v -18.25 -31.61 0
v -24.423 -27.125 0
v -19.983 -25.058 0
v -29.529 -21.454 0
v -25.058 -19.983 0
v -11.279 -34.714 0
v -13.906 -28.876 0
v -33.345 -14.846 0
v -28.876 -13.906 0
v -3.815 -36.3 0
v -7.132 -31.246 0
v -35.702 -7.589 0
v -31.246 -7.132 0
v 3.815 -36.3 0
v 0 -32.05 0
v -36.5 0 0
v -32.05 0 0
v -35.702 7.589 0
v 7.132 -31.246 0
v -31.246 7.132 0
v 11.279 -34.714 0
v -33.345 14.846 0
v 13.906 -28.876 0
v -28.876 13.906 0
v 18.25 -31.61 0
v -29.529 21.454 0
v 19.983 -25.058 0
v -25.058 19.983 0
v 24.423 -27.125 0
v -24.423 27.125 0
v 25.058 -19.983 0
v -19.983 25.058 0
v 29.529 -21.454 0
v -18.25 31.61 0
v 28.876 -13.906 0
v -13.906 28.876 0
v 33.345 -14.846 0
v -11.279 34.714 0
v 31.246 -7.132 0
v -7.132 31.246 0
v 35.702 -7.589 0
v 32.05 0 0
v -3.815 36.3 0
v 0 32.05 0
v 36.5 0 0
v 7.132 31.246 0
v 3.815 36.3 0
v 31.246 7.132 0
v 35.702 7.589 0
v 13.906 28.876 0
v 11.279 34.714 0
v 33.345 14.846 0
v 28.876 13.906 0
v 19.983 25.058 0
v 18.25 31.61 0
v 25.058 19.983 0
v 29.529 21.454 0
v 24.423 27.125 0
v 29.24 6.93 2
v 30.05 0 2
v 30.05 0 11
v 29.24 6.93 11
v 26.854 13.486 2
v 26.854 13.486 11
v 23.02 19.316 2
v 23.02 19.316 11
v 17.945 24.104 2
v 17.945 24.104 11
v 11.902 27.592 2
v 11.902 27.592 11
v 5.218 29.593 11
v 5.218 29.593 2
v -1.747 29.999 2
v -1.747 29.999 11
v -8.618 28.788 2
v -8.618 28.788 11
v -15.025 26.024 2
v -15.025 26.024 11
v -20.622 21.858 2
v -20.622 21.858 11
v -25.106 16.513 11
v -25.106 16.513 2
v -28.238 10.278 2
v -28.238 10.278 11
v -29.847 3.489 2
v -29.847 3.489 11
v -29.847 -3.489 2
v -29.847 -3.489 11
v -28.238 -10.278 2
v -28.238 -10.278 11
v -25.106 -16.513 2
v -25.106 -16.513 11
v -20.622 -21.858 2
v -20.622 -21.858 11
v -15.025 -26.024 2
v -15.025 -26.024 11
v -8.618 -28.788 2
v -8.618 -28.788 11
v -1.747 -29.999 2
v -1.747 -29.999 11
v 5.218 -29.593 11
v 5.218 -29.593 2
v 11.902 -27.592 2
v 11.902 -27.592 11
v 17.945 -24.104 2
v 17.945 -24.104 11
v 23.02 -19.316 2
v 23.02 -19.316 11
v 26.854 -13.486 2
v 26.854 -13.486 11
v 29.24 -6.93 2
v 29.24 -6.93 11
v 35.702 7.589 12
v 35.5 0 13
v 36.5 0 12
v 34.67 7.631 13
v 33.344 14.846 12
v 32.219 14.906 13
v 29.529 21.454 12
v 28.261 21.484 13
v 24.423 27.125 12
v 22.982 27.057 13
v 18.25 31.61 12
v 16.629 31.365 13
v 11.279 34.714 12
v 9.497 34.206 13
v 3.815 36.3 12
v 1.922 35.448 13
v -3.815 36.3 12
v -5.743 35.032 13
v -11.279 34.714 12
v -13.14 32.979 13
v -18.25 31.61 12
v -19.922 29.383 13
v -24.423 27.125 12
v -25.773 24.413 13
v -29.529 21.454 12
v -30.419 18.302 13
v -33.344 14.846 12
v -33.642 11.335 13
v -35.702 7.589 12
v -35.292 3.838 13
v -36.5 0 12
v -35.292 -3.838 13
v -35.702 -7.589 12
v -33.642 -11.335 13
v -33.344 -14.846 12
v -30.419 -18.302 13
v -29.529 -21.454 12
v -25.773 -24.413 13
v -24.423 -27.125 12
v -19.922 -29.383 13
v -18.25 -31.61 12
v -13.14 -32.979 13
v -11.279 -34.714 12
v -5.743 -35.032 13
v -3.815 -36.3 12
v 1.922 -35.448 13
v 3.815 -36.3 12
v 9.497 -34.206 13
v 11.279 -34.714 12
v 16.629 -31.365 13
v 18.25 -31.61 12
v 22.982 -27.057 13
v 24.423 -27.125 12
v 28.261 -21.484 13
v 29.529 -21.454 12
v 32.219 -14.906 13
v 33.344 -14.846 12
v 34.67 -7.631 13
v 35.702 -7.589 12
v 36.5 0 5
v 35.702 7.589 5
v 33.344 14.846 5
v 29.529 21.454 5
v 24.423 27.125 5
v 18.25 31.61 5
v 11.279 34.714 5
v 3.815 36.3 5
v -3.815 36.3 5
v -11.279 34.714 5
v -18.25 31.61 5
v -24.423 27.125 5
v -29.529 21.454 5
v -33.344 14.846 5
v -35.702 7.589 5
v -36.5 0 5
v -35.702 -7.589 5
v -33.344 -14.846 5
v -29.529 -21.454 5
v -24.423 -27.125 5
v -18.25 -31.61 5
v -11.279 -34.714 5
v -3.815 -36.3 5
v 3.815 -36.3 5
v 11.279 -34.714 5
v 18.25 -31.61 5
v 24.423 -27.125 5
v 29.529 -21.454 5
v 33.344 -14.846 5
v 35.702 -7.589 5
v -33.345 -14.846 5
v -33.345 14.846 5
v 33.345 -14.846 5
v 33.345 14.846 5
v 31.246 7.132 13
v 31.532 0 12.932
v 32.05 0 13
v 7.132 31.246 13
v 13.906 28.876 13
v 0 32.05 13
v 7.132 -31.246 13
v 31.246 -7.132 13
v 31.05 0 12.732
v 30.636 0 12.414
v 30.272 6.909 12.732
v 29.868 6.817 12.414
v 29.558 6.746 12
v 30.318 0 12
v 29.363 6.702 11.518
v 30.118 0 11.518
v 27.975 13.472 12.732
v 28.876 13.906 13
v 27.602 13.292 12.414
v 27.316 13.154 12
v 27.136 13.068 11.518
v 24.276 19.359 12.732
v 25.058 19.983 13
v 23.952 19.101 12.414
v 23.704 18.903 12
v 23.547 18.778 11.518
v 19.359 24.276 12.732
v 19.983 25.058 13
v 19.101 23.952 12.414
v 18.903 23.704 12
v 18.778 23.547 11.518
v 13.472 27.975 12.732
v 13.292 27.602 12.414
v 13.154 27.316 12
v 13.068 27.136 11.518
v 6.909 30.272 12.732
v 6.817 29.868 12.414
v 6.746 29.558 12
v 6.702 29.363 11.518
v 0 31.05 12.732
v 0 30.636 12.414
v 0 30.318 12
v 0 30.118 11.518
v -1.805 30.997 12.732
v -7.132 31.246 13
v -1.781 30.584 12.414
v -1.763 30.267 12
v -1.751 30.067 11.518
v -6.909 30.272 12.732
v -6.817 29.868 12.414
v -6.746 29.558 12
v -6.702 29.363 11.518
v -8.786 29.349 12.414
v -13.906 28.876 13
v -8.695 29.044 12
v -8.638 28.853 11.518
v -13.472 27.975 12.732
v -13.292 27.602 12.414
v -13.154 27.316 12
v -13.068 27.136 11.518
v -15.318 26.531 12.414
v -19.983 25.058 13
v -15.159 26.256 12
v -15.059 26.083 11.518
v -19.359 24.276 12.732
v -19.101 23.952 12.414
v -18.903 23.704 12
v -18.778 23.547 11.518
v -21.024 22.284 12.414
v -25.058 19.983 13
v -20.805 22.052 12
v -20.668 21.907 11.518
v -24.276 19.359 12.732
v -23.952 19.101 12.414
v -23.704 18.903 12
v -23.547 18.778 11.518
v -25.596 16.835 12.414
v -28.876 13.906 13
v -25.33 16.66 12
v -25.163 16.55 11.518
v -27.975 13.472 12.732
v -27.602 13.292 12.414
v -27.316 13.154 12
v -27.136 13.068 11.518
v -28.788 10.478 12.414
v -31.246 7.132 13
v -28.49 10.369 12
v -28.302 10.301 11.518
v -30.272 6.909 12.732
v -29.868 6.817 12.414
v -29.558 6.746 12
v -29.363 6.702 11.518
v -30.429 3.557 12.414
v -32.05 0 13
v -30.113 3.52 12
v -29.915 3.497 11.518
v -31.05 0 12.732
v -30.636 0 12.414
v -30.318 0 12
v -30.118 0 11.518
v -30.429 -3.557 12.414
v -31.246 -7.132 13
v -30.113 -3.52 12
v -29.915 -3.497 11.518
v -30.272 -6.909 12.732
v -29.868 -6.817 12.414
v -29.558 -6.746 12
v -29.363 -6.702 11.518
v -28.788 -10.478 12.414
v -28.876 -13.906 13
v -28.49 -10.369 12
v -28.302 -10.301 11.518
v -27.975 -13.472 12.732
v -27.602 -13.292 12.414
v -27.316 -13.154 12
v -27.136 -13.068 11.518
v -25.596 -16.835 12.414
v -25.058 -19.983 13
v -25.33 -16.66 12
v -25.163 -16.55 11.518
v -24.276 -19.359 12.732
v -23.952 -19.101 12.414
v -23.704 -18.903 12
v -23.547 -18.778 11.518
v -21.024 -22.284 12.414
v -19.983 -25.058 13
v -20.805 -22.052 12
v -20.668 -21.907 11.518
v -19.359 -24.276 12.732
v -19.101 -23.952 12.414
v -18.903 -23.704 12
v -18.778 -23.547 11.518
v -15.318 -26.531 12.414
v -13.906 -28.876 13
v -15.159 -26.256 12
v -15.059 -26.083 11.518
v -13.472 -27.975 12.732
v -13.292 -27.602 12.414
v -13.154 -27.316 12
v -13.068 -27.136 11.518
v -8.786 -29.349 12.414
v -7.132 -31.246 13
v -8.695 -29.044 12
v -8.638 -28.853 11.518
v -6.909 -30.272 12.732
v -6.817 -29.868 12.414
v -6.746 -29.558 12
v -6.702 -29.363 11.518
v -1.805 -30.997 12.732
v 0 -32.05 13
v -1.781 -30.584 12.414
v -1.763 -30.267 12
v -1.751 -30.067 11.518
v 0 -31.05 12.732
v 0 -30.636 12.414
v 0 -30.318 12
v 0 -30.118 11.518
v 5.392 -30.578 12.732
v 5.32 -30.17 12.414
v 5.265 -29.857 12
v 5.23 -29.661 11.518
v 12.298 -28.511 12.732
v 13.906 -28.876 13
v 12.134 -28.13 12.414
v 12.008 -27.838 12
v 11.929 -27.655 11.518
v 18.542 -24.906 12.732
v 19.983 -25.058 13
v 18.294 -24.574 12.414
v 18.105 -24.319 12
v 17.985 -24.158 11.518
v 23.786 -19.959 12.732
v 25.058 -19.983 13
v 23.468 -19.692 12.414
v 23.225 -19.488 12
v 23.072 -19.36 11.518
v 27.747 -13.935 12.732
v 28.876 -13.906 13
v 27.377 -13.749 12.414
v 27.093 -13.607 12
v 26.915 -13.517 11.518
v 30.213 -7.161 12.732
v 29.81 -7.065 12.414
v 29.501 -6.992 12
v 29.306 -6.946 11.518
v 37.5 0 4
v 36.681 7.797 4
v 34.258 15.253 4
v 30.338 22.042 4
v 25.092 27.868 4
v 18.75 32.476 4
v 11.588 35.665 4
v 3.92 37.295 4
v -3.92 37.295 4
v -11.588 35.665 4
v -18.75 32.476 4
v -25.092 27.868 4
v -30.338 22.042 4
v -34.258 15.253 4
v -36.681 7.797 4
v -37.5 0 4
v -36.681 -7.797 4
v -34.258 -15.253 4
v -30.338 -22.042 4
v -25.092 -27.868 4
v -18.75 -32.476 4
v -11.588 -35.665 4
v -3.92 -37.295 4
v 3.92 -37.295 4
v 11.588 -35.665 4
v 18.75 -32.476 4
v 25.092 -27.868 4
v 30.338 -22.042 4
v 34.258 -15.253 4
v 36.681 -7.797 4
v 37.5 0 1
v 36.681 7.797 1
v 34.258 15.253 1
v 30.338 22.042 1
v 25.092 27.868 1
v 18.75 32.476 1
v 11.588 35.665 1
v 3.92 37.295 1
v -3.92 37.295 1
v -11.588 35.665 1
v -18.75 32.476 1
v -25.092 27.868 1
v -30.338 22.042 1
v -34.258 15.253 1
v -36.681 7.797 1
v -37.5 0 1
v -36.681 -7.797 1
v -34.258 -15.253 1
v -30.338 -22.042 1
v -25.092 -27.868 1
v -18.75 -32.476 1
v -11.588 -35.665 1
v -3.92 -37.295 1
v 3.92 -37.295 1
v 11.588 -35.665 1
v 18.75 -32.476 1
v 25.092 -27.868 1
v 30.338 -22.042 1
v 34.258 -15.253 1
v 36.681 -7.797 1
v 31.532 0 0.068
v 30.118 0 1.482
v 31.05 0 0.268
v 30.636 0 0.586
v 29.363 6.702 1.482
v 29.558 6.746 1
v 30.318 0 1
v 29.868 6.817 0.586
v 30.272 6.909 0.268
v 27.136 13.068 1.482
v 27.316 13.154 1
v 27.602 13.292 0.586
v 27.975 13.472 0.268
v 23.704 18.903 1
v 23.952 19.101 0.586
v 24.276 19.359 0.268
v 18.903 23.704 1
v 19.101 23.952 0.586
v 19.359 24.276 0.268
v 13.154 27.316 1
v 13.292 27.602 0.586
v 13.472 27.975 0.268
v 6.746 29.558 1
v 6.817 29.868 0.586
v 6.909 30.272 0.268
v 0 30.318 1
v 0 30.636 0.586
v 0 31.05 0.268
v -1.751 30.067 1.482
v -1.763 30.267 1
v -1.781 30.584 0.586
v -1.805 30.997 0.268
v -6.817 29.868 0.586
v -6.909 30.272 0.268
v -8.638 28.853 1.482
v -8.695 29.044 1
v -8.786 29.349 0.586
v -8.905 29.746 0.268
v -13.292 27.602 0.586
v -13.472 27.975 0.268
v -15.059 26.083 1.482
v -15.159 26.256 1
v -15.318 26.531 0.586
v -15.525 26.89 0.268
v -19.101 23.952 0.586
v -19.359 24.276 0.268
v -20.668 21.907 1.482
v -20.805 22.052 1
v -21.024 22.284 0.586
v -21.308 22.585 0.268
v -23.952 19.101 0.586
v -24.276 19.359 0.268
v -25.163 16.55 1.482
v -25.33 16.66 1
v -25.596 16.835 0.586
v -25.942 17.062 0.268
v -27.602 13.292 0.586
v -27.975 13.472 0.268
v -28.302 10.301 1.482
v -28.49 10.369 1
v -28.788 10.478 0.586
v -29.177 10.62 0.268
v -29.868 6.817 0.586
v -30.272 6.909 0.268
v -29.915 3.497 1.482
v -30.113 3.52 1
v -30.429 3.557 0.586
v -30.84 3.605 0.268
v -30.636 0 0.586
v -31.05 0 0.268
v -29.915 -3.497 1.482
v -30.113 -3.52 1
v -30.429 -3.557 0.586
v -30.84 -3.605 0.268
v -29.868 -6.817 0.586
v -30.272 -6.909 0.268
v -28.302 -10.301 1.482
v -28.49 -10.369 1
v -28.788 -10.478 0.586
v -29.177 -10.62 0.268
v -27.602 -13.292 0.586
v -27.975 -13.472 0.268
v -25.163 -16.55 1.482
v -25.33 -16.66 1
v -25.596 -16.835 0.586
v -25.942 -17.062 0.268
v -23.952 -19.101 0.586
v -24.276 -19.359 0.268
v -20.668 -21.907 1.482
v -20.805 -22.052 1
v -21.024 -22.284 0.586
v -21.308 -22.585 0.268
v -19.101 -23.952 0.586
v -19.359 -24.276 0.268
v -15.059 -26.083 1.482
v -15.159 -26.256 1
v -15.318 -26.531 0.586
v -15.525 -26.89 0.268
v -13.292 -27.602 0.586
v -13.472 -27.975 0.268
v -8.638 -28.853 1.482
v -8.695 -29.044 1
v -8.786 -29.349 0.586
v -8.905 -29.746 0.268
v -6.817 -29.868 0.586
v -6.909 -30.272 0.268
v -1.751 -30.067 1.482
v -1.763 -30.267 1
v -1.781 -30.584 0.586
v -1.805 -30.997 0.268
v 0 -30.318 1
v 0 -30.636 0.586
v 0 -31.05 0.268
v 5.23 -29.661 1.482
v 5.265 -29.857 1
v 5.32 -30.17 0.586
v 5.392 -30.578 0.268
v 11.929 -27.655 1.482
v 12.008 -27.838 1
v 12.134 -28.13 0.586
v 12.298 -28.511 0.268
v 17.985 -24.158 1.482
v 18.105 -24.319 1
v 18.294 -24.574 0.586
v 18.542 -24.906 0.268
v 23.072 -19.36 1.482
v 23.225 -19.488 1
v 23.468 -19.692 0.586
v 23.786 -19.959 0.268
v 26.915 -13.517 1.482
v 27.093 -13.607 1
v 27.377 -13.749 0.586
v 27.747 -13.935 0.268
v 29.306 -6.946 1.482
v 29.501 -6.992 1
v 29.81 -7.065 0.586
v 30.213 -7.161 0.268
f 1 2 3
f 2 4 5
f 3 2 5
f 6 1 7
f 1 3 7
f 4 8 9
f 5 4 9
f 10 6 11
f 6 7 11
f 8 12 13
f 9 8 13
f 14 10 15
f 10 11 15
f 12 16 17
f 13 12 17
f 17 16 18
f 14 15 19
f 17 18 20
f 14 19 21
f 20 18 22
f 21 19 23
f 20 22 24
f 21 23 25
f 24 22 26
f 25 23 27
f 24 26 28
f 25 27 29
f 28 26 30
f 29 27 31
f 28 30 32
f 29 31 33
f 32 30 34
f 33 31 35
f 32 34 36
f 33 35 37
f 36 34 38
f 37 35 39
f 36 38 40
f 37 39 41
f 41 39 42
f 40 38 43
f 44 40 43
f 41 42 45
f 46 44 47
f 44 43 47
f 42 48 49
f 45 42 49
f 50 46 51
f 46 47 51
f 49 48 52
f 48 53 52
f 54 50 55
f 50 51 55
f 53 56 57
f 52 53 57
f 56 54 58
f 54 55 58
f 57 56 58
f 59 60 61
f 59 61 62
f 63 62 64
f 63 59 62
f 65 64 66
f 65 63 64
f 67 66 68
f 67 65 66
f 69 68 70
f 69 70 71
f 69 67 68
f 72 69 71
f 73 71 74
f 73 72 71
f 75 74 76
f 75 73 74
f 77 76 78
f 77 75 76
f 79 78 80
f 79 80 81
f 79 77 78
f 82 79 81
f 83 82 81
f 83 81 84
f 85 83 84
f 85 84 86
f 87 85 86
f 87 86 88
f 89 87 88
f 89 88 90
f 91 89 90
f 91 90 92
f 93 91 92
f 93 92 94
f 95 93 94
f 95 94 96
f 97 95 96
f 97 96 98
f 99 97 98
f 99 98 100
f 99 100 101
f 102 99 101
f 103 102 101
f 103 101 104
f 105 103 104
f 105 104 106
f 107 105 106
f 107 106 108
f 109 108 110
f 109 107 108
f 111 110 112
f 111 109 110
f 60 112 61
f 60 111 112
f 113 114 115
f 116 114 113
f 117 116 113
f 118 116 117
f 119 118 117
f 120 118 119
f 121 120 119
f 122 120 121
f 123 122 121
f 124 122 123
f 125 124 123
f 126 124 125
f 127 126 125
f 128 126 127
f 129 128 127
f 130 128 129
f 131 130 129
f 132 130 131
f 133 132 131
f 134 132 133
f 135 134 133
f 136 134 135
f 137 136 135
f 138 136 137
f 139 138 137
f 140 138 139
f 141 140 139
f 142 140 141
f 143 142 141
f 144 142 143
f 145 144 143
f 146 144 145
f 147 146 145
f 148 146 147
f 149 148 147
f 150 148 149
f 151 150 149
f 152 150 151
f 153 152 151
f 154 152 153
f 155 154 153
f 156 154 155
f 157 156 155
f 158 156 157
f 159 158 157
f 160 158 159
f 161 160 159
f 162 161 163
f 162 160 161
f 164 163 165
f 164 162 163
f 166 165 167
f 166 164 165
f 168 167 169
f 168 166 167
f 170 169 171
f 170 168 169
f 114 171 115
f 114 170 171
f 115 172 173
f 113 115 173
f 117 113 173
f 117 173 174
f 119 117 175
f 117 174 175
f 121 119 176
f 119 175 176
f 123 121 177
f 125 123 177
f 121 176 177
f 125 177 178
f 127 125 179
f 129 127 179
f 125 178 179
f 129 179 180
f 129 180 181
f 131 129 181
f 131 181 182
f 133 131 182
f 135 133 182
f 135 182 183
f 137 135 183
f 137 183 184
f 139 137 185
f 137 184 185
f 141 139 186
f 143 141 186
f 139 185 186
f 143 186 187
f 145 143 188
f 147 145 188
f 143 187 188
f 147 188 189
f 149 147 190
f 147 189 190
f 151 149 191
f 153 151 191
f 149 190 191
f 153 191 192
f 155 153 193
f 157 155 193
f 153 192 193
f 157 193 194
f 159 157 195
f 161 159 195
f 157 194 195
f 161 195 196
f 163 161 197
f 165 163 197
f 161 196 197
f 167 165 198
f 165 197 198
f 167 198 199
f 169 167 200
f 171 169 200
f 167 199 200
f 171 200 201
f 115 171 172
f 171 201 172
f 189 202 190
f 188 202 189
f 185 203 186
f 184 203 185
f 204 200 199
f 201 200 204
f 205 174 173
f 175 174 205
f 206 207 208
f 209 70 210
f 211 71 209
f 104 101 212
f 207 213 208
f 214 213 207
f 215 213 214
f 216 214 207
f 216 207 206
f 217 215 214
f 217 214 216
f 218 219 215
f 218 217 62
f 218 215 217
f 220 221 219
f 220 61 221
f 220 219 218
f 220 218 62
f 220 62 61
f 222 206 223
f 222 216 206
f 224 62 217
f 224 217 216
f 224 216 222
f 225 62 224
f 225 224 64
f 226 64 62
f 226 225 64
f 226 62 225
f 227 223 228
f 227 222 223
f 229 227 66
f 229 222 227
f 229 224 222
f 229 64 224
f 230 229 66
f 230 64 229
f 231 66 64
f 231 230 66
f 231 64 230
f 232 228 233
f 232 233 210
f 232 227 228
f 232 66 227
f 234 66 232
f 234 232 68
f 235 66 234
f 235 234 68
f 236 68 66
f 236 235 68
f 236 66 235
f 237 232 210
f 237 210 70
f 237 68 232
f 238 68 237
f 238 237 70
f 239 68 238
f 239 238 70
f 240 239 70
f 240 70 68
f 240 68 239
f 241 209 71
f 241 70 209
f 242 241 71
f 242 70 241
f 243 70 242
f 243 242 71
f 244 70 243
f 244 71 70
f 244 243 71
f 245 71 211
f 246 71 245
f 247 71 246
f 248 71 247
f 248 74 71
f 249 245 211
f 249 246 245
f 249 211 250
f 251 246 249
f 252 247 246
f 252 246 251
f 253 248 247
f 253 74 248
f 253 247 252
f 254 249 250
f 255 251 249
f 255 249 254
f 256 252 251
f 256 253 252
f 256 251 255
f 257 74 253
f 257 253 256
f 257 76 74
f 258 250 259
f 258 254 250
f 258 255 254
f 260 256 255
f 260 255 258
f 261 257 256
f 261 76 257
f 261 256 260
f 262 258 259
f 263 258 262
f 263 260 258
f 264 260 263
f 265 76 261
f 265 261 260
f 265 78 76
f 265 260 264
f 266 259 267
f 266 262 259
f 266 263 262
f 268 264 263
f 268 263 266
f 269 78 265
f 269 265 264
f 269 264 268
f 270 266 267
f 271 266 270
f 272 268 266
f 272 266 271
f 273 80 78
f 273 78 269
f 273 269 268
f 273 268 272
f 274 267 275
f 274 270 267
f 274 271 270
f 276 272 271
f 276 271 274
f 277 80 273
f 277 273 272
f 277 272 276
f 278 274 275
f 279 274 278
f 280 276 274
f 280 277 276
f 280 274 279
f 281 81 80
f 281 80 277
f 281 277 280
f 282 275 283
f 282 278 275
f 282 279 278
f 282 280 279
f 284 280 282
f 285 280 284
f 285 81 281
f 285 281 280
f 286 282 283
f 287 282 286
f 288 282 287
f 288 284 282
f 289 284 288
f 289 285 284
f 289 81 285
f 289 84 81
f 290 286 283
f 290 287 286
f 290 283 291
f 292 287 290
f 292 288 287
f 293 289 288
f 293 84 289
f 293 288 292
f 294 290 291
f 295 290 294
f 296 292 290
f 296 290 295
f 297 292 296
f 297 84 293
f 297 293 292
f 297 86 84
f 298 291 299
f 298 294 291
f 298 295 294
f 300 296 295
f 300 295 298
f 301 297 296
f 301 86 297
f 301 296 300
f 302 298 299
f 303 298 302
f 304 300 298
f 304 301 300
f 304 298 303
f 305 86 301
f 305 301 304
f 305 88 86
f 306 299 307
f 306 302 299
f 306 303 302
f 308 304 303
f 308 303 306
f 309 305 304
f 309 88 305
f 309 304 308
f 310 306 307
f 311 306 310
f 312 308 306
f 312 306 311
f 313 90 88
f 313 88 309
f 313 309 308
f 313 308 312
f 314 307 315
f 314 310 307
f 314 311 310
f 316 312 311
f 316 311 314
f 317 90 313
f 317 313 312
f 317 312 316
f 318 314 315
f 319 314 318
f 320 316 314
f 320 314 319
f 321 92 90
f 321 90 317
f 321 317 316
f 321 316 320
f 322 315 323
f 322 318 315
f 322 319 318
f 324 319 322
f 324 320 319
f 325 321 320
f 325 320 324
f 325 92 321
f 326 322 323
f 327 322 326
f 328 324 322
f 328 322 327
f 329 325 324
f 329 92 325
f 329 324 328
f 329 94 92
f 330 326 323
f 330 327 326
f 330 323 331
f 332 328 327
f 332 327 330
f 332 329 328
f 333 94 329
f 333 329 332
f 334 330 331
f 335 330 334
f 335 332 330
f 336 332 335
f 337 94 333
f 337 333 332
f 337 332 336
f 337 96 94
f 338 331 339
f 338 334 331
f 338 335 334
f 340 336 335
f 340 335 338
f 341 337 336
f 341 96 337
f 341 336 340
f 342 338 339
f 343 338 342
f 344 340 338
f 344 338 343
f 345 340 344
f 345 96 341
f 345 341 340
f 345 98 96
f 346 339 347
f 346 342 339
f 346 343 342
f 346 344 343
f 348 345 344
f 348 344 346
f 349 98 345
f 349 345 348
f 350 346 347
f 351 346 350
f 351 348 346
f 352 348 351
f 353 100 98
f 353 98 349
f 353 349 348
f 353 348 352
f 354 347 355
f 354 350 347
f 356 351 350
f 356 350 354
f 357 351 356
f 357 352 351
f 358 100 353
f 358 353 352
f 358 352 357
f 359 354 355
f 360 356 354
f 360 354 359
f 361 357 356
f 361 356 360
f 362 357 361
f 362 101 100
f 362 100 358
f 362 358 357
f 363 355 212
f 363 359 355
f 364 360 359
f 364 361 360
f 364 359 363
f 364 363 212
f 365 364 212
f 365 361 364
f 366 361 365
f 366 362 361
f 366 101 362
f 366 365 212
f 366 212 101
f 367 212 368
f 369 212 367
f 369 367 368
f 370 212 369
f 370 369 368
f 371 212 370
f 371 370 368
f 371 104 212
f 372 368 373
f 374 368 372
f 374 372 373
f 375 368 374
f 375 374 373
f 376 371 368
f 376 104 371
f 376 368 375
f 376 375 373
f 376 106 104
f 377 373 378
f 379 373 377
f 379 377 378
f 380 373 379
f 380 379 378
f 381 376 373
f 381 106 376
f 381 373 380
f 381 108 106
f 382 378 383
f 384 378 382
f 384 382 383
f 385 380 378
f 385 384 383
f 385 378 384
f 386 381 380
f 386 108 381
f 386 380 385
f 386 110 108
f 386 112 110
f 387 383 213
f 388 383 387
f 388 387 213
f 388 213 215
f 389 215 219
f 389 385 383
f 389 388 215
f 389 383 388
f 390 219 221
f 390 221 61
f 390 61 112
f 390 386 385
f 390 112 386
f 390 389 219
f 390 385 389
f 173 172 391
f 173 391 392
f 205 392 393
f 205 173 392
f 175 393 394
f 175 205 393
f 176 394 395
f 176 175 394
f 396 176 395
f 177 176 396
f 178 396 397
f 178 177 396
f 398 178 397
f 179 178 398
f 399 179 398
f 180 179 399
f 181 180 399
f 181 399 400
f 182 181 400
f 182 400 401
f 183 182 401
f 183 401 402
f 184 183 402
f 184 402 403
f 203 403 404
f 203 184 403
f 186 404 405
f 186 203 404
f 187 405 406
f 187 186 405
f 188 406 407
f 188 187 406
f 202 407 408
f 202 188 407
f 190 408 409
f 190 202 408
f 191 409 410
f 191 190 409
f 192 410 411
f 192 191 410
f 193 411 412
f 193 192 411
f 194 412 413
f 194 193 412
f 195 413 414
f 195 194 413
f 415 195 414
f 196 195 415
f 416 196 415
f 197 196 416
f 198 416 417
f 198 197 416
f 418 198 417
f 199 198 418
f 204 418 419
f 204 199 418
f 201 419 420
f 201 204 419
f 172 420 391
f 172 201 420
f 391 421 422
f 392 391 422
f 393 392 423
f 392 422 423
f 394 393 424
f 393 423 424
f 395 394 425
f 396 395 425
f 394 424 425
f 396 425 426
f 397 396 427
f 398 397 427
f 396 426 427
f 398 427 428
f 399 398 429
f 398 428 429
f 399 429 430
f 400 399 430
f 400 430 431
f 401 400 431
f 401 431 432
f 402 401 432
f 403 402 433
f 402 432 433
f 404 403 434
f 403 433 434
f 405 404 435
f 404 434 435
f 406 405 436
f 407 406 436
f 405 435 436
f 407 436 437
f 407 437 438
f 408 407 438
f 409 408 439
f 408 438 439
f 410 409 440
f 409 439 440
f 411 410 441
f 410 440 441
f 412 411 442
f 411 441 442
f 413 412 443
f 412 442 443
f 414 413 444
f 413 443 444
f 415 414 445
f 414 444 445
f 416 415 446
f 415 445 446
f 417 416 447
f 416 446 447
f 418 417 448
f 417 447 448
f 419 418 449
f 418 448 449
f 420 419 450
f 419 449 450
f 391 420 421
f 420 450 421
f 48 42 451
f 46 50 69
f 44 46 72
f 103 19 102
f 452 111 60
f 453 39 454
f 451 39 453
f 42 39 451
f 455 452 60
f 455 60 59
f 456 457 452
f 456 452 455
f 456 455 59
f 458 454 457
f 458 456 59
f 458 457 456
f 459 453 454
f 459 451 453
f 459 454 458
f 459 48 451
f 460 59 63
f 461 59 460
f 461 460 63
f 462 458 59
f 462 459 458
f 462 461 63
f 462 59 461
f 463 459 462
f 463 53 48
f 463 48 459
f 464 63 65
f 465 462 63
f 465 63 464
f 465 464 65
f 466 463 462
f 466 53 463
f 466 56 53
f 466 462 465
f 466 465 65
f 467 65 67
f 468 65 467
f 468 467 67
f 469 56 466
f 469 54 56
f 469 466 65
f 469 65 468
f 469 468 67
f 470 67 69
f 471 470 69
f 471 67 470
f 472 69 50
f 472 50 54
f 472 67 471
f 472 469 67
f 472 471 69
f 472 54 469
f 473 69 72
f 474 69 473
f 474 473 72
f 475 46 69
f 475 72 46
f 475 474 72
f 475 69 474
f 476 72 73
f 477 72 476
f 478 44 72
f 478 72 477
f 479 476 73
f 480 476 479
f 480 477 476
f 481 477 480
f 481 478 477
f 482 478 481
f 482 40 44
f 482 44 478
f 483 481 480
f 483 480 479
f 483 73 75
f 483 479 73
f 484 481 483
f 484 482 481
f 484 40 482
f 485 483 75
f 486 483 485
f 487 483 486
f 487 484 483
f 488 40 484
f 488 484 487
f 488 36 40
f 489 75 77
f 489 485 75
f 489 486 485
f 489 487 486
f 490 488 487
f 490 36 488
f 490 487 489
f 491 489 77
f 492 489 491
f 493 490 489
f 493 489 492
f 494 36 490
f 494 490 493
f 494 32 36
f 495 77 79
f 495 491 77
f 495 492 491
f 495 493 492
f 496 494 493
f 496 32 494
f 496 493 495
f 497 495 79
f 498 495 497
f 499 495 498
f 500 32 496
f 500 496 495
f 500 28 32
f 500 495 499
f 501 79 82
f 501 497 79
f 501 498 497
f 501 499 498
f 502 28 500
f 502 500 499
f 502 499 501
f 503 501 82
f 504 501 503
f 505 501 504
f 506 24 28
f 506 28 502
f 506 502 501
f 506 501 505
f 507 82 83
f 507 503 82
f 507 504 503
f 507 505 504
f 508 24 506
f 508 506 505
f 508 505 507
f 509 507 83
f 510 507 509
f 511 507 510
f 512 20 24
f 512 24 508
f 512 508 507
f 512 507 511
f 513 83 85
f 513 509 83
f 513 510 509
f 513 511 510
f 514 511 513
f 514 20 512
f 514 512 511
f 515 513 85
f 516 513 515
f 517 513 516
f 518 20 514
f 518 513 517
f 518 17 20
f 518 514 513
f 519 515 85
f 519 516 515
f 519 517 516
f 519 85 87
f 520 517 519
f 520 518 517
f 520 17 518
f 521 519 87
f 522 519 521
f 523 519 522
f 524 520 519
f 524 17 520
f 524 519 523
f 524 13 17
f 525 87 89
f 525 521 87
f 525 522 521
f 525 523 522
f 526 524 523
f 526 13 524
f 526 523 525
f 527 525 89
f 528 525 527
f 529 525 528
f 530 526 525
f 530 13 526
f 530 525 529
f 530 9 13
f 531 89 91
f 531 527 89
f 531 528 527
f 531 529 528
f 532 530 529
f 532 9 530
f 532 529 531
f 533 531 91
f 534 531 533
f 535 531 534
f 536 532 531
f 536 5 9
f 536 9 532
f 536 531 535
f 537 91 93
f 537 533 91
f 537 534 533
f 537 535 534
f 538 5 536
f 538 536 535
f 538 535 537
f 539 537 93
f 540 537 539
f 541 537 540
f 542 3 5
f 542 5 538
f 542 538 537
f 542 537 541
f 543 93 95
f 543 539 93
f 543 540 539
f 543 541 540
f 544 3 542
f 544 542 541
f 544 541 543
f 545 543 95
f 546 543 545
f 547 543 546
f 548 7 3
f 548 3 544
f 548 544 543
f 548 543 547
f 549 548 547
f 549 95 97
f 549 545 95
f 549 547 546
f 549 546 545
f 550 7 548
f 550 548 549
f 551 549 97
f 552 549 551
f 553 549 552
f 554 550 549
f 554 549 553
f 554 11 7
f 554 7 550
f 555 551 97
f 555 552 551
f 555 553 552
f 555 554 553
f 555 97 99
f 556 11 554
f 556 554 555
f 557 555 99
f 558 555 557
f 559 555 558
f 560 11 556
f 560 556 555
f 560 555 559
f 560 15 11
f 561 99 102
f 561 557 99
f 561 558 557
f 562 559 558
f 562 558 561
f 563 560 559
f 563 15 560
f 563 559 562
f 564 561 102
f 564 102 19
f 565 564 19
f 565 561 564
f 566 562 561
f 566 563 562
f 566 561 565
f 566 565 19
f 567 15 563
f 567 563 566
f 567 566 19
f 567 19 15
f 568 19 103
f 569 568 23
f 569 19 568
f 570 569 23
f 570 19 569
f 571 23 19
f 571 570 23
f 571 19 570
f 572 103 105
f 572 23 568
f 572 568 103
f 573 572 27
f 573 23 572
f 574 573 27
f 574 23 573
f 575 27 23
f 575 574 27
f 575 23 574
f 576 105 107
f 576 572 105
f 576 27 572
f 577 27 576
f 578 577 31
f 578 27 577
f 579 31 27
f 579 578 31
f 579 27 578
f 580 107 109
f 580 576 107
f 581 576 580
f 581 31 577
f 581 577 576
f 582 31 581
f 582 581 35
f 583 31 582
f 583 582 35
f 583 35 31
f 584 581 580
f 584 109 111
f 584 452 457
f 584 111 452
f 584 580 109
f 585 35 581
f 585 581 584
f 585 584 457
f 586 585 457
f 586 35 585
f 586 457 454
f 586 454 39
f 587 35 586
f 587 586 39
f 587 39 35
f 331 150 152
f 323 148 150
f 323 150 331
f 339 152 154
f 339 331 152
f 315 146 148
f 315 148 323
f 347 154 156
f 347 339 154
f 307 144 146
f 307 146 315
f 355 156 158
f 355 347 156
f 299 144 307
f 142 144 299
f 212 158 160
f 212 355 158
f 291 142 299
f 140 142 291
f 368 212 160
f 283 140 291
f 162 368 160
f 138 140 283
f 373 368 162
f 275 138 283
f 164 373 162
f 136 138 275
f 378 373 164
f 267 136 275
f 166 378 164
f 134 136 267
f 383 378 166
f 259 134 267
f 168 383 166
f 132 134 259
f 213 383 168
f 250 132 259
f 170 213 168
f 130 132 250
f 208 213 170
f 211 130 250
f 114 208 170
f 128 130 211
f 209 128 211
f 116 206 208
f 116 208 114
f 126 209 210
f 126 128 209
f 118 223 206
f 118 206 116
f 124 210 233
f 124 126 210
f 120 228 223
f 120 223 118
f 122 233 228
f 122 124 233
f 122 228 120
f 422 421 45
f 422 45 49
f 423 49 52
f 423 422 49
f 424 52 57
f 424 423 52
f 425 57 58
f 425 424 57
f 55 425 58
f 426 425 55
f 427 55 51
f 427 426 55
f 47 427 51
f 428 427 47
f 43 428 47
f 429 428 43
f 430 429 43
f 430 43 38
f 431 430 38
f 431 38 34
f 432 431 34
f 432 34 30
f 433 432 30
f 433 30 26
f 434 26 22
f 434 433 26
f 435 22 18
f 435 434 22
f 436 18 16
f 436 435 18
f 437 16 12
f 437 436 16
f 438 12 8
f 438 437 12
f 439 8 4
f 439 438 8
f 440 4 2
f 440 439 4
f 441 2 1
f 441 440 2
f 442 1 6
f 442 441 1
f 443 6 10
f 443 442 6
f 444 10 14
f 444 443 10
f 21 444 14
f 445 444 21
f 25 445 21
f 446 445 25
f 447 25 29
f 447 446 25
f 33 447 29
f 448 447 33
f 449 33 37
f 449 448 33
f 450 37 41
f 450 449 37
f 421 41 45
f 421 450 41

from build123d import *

# Parameters (mm, degrees)
SKETCH1_R           = 37.5
SKETCH1_R_2         = 30.05
BOSS_EXTRUDE1_DEPTH = 5
SKETCH2_R           = 36.5
SKETCH2_R_2         = 30.05
BOSS_EXTRUDE2_DEPTH = 8
CHAMFER1_SIZE       = 1
FILLET1_R           = 2


with BuildPart() as part:
    # Sketch1 → Boss-Extrude1 (new body)
    with BuildSketch(Plane.XY):
        Circle(SKETCH1_R)
        Circle(SKETCH1_R_2, mode=Mode.SUBTRACT)
    extrude(amount=BOSS_EXTRUDE1_DEPTH)

    # Sketch2 → Boss-Extrude2 (add)
    with BuildSketch(Plane.XY.offset(5)):
        Circle(SKETCH2_R)
        Circle(SKETCH2_R_2, mode=Mode.SUBTRACT)
    extrude(amount=BOSS_EXTRUDE2_DEPTH)

    # Chamfer1
    chamfer1_edges = [part.edges().sort_by_distance(p)[0] for p in [
        (-36.5, 0, 13),
        (-37.5, 0, 0),
        (-37.5, 0, 5),
    ]]
    chamfer(chamfer1_edges, length=CHAMFER1_SIZE - 0.0001)  # a hair under: the kernel refuses the full size

    # Fillet1
    fillet1_edges = [part.edges().sort_by_distance(p)[0] for p in [
        (-30.05, 0, 13),
        (-30.05, 0, 0),
    ]]
    fillet(fillet1_edges, radius=FILLET1_R)


solid = part.part
